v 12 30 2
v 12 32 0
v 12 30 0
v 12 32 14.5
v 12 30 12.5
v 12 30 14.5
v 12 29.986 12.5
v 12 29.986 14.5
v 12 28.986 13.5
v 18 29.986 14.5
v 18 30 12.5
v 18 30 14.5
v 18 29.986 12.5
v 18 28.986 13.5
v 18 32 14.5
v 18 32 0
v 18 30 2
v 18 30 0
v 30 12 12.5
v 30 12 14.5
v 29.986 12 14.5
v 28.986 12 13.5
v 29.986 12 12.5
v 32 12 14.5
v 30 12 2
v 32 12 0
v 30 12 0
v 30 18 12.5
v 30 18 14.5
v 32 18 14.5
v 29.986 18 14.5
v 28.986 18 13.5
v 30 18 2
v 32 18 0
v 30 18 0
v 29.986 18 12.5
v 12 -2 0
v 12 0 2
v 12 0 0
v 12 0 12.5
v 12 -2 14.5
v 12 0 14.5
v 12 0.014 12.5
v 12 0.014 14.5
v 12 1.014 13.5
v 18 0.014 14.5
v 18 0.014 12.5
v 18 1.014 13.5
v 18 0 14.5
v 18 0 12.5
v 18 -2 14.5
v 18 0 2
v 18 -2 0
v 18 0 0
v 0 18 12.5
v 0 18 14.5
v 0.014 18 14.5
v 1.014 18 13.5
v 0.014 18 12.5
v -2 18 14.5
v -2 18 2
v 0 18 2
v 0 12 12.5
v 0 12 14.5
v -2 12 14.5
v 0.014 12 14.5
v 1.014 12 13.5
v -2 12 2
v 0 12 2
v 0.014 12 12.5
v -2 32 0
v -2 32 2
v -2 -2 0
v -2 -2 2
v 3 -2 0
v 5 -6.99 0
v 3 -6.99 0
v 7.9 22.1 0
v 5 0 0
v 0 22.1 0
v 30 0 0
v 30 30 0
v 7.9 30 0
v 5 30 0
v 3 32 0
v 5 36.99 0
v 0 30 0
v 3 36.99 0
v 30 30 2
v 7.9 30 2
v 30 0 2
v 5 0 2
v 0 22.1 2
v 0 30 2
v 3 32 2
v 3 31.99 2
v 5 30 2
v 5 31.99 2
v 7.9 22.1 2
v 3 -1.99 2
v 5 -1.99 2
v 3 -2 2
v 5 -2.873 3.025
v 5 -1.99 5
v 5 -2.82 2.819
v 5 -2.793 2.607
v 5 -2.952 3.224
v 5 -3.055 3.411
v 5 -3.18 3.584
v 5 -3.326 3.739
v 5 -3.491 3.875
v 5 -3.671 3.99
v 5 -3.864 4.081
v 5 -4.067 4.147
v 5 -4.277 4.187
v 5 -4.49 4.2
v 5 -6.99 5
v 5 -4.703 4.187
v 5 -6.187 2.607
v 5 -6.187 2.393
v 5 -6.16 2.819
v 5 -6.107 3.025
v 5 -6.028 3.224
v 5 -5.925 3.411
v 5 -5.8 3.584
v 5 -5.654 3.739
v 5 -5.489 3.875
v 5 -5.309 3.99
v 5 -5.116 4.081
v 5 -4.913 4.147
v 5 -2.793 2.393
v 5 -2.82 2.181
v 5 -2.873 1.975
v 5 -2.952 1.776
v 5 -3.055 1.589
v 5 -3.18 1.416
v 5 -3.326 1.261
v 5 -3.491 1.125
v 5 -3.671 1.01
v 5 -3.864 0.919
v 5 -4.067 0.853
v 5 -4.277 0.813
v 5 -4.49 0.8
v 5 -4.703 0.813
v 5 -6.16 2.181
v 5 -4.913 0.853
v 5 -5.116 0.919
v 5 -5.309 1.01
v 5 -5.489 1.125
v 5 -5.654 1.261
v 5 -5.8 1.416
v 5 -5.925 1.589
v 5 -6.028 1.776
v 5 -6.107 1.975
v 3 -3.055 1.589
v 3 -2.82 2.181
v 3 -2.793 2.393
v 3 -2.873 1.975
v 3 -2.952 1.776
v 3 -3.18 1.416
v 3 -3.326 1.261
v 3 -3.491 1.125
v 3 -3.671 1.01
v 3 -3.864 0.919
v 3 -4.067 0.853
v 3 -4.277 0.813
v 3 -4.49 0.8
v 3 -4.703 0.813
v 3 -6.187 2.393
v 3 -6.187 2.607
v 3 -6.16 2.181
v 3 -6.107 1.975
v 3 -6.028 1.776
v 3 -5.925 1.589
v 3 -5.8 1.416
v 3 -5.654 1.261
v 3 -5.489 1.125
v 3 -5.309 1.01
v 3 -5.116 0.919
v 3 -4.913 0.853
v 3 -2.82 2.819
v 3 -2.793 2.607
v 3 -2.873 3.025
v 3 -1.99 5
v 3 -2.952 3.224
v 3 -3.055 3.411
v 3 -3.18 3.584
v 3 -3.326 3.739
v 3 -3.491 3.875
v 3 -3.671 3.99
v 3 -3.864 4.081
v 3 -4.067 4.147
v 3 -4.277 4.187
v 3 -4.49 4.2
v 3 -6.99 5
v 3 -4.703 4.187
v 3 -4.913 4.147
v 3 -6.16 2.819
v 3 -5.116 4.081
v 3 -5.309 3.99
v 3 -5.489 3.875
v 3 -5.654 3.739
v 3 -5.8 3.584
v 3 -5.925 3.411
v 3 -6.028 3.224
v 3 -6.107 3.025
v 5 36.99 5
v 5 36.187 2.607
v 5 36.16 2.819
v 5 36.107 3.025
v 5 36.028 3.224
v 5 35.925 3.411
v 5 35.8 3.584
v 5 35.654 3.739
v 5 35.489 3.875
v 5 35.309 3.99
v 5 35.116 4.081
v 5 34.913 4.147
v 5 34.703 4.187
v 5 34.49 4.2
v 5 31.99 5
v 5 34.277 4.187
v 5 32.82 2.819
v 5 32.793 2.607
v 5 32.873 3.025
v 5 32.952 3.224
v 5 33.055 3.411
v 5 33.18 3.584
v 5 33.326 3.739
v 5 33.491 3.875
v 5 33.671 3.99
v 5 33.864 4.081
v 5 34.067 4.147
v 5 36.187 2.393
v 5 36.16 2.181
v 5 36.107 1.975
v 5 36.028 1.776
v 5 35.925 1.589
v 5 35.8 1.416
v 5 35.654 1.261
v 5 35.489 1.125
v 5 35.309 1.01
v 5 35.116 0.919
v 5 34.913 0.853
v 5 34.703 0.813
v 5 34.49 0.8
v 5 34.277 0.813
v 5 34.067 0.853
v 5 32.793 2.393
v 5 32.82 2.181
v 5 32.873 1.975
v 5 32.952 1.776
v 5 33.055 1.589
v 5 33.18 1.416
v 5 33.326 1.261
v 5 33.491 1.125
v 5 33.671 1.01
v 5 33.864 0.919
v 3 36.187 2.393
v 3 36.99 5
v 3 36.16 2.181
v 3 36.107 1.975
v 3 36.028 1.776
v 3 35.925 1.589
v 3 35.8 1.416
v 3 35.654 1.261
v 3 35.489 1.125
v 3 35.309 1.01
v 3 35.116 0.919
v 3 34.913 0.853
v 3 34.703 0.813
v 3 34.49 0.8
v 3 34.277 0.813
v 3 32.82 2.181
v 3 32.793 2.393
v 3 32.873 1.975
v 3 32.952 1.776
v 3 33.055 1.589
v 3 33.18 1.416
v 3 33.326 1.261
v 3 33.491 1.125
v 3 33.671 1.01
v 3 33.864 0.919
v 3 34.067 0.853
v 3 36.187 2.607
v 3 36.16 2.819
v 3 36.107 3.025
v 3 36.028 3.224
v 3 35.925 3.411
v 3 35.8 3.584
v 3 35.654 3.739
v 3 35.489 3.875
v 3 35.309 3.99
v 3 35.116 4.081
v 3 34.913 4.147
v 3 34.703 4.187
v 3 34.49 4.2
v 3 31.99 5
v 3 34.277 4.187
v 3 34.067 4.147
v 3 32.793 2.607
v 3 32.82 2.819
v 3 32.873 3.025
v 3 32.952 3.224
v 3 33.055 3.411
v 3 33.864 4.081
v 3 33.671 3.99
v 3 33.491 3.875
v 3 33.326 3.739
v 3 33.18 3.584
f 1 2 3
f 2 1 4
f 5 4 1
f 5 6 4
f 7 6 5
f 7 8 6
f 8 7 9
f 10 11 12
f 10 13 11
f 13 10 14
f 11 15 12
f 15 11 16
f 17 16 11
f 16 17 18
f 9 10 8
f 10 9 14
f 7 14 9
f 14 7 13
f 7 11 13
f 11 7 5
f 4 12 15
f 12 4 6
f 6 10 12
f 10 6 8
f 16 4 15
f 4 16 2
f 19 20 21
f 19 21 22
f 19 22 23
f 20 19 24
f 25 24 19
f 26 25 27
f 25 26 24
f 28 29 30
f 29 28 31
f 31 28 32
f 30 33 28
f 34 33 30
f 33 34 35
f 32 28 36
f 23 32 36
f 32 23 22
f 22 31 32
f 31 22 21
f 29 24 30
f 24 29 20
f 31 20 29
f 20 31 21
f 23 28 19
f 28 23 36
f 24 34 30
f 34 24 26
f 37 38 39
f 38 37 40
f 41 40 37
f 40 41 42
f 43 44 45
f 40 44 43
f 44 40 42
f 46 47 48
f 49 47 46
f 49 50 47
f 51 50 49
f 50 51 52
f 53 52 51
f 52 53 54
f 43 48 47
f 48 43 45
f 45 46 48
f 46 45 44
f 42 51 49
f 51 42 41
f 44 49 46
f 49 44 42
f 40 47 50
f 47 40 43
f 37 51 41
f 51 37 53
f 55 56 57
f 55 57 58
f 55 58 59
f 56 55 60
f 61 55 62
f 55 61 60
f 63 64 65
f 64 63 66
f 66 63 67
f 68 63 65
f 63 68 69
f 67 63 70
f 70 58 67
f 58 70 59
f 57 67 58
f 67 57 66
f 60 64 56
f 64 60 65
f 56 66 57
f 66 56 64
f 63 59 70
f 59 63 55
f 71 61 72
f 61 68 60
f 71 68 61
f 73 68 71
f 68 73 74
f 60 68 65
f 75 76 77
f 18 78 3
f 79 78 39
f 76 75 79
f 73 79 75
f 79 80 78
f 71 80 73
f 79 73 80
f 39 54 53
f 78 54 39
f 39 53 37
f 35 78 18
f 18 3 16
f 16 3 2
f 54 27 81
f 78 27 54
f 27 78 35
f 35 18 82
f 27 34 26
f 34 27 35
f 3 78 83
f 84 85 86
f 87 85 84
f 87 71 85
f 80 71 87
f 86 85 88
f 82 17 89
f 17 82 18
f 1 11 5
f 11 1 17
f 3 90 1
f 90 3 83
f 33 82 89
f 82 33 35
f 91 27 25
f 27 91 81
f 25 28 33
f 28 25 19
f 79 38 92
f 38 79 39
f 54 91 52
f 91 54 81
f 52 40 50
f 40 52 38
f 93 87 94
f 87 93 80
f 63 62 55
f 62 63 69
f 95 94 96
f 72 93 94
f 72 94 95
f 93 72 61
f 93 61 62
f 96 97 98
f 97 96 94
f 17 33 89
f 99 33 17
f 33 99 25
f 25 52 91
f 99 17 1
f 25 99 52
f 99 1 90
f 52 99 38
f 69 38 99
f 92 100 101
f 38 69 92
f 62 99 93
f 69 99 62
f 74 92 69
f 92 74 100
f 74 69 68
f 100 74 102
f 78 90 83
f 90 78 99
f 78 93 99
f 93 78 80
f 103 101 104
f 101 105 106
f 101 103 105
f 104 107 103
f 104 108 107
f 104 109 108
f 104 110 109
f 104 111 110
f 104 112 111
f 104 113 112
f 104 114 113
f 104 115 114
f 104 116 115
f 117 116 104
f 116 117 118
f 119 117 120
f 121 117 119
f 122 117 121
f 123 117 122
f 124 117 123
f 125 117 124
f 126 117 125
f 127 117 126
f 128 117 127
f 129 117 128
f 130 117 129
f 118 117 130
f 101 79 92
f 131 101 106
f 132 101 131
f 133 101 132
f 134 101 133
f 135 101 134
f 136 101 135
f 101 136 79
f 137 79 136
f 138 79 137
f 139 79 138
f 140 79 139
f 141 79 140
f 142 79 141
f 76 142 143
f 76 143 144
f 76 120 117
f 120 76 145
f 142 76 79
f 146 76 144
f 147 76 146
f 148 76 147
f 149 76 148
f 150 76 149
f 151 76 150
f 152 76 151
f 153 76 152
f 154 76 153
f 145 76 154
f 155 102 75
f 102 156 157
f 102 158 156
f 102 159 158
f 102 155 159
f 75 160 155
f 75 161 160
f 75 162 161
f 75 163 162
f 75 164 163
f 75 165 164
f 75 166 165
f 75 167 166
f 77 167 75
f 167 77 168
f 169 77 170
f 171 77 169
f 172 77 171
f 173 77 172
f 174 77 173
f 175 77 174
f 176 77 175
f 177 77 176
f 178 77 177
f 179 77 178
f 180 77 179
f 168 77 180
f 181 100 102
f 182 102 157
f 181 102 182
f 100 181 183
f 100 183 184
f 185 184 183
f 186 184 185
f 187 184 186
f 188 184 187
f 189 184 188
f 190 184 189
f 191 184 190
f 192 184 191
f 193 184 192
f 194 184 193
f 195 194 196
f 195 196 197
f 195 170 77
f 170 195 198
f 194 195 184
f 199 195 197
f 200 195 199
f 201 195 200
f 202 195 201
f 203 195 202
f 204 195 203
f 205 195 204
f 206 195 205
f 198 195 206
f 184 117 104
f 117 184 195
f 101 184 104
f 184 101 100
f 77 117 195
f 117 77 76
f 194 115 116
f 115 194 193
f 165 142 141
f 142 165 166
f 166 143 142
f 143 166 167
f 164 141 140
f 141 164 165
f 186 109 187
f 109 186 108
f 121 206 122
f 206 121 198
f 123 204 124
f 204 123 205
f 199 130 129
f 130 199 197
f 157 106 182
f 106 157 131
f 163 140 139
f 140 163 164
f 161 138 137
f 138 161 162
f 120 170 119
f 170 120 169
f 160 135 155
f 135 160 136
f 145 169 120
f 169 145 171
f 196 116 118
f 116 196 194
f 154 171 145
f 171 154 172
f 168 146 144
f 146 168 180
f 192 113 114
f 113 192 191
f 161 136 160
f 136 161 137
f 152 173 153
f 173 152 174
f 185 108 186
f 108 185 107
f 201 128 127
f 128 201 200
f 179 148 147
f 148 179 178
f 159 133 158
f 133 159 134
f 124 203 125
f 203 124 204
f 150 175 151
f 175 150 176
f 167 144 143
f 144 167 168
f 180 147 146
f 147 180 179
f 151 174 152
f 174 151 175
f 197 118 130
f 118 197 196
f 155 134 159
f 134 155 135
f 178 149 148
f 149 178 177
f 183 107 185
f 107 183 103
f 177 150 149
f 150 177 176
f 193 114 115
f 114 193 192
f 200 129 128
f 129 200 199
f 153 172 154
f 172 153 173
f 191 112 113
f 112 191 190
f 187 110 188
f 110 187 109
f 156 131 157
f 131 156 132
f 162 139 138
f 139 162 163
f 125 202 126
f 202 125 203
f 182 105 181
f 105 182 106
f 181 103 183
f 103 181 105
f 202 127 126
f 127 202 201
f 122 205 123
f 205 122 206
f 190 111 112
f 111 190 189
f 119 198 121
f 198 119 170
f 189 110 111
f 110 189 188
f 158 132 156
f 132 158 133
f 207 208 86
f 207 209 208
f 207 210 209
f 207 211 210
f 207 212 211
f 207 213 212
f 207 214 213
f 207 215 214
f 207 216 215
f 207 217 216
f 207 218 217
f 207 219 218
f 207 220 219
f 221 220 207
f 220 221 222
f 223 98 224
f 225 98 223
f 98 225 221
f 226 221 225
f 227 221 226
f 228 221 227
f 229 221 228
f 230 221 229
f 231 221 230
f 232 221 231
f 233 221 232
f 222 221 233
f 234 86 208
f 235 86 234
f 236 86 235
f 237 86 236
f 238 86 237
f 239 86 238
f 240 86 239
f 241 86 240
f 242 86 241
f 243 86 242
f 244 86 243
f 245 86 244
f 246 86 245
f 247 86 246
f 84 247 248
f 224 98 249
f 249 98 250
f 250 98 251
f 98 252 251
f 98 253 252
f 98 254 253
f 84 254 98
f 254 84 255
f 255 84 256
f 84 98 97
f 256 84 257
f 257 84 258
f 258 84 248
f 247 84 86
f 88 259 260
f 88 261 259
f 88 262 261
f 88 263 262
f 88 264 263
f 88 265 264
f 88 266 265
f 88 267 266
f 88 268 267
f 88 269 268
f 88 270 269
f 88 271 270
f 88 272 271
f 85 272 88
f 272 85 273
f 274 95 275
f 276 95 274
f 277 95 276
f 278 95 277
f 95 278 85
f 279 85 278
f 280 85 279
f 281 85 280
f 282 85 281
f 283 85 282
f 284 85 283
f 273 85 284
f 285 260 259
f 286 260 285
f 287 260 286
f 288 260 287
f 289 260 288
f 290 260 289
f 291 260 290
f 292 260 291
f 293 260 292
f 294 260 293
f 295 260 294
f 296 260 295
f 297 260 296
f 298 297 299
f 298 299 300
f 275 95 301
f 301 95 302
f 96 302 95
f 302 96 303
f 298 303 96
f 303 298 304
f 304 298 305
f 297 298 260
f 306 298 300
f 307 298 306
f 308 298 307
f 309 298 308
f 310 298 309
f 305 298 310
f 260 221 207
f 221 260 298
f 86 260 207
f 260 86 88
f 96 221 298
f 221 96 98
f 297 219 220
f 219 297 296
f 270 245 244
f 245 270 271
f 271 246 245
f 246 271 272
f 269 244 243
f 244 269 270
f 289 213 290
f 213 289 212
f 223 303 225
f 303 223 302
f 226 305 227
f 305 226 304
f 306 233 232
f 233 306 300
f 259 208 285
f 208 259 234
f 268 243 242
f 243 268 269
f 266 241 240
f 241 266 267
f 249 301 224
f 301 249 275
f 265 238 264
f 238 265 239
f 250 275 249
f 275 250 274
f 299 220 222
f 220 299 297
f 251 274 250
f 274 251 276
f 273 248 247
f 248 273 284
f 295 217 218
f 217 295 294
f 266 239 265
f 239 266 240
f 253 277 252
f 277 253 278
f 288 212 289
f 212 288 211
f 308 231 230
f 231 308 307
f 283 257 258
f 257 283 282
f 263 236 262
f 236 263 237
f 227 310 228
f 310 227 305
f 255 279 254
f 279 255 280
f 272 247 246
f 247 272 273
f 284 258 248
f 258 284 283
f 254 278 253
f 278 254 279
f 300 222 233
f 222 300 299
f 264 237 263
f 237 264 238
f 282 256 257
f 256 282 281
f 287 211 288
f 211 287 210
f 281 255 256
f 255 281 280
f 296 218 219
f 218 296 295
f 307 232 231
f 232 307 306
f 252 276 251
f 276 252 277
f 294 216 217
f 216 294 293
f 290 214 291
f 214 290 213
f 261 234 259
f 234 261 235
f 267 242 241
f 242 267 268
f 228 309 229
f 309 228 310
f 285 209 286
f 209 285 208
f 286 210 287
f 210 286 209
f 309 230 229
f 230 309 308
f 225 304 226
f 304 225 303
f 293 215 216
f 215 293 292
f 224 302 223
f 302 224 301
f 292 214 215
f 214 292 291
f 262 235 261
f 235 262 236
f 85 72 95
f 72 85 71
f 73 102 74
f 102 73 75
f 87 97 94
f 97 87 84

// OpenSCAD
// file: ../../lib/utils.scad
// Cube with rounded corners
// roundedCornerCube (50,50,4);
module roundedCornerCube(length, width, thickness){

        hull()
        {
            translate([length/2 - 2, width/2 - 2, 0]) cylinder(r=2, h=thickness, $fn=50, center=true);
            translate([length/2 - 2, -width/2 + 2, 0]) cylinder(r=2, h=thickness, $fn=50, center=true);
            translate([-length/2 + 2, width/2 - 2, 0]) cylinder(r=2, h=thickness, $fn=50, center=true);
            translate([-length/2 + 2, -width/2 + 2, 0]) cylinder(r=2, h=thickness, $fn=50, center=true);
        }

}

// Hollow cube with rounded corners. Will look like a frame with rounded con
// hollowRoundedCornerCube(50,70,4,2);
module hollowRoundedCornerCube(length, width, thickness, wallthickness)
{
    difference()
    {
        roundedCornerCube(length,width,thickness);
        roundedCornerCube(length-(wallthickness*2),width-(wallthickness*2),thickness);
    }
}

/*
module cylinderWithHandle(radius, thickness)
{
    rotate_extrude($fn=100)
        polygon( points = [[0,0], [radius,0], [radius,thickness] , [1,thickness], [2,thickness + 2] , [2,thickness + 6],[0,thickness + 6]] );
}
*/


// hollow cylinder
// hollowCylinder(radius, height, wallThickness)
// radius : radius to outter wall
// wallThickness : Thickness of wall
module hollowCylinder(radius, height, wallThickness)
{

    difference()
    {
        cylinder(h=height, r1=radius, r2=radius);
        cylinder(h=height, r1=radius - wallThickness, r2=radius - wallThickness);
    }
}


// hollow cylinders
// hollowCylinders(20, 10, 2, 2, 2)
// radius : radius to outer wall
// gapsSize : size of gap between each rings
// minradius : radius of the smallest ring
module hollowCylinders(radius, height, wallThickness, gapSize, minRadius)
{
    for (i = [radius : -(gapSize + wallThickness) : minRadius])
    {
       //echo (i);
       hollowCylinder(i,height,wallThickness);
    }
}

//
// b = bottom diameter
// t = top diameter
// h = height
module cone(b, t, h)
{
    cylinder(h=h, r1=b/2, r2=t/2, $fn=100);
}

// hollowCone(10,4,20, 2)
module hollowCone(bottomRadius, topRadius, height, wallThickness)
{
    difference()
    {
        cylinder(h=height, r1=bottomRadius, r2=topRadius, $fn=100);
        cylinder(h=height, r1=bottomRadius - wallThickness, r2=topRadius - wallThickness, $fn=100);
    }
}


// w = width between flat surface
// h = height
module hex (w=10, h=2){
  cylinder (r=w/2, h=h, center=true, $fn=6);
}

// hollowCone(10,4,20, 2)
module hollowHex(w=10, h=2, th=2)
{
    difference()
    {
        cylinder (r=w/2, h=h, center=true, $fn=6);
        cylinder (r=w/2 - th, h=h, center=true, $fn=6);
    }
}

// h : height
// ns : number of sides for base
// br : bottom radius
// tr : top radius
// ro : rotation in degree between bottom and top
// sl : slice layer. high value give smooth appearence
module twistExtrude(h=50,ns=6,br=20,tr=20,ro=100,sl=5)
{

	linear_extrude(height = h, twist  = ro,	slices = sl, scale  = tr/br)
		circle(r=br, $fn=ns);
}


// h : height
// ns : number of sides for base
// br : bottom radius
// tr : top radius
// ro : rotation in degree between bottom and top
// sl : slice layer. high value give smooth appearence
// wt : wall thickness
module hollowTwistExtrude(h=50,ns=6,br=20,tr=20,ro=100,sl=5,wt=1)
{
	difference()
	{
		linear_extrude(height = h, twist  = ro,	slices = sl, scale  = tr/br)
			circle(r=br, $fn=ns);

    translate([0,0,-.01])
		linear_extrude(height = h + .1, twist  = ro,	slices = sl, scale  = tr/br)
			circle(r=br - wt, $fn=ns);
	}
}


///////////////////////////////////////////////////////////////////////////////////////////////////////////////////

// honeycomb tiles
// honeycombSquare(100,100,4,10,2);
module honeycombTiles(length, width,thickness,rad,wallThickness)
{
    //thickness = 4;
    //rad = 10;
    //wallThickness = 2;
    //length = 100;
    //width = 100;

    for (w=[0: width/rad])
    {

        if (w % 2 == 0)
        {
            //cylinder($fn=6, r=rad, h=2);
            for (i = [0 : length/((rad*2) + (wallThickness*2))])
            {
              translate([rad*(3*i) + (wallThickness*2)*i,w*rad,0]) cylinder($fn=6, r=rad, h=thickness);

              //translate([rad*6 + (wallThickness*2)*2,0,0]) cylinder($fn=6, r=10, h=2);
              //translate([rad*9 + (wallThickness*2)*3,0,0]) cylinder($fn=6, r=10, h=2);
            }
        }

        if (w % 2 == 1)
        {
            for (j = [1 : 2 : (length/(rad + wallThickness))])
            {
              translate([(rad*1.5) *j + wallThickness *j , (w*rad) + wallThickness/2 ,0])  cylinder($fn=6, r=rad, h=thickness);
                //translate([(rad*1.5) *3 + wallThickness *3 ,10,0]) circle($fn=6, r=10);
                //translate([(rad*1.5) *5 + wallThickness *5 ,10,0]) circle($fn=6, r=10);
            }
        }
    }
}

// honeycomb square
// A square area with hollow honeycomb design
// honeycombSquare(100,100,4,10,2);
module honeycombSquare(length, width, thickness, cellRad,wallThickness)
{
    difference()
    {
        cube([length,width,thickness], center=true);
        translate([-length/2,-width/2, -thickness/2]) honeycombTiles(length,width,thickness,cellRad,wallThickness);
    }
}

//honeycomb(length, width, height, cell_size, wall_thickness);
//honeycomb(50, 50, 4, 10, 1);
//hollowRoundedCornerCube(50,70,4,2);

//hollowCylinder(10,20,2);

//hollowCylinders(20, 10, 2, 2, 2);
//cone(10,2,20);

// hollowCone(10,4,20, 2);

// honeycombSquare(40,40,2,5,2);


module edgeClamp(l=10)
{
   difference()
   {
    translate([0,.6,0]) rotate([45,0,0]) cube([l,2,2], center=true);
    translate([0,.6,1.5]) cube([l + .1,1,1], center=true);
    translate([0,.6,-1.5]) cube([l + .1,1,1], center=true);
   }
   cube([l,2,2], center=true);
}

cube([10,2,2], center=true);
translate([0,0,2]) edgeClamp();
// main file
use <../../lib/utils.scad>

/*
l = 29.9
w=29.9
h=10.5
*/


// h = height
// wt = wall thickness
// sw = side stop width
// bl =  base inside length
// bw = base inside width
// bt = base thickness
module cam_sideStops(h,wt, sw, bl,bw,bt)
{

  //when in front view
  //top
  translate([(bl-sw)/2,bw,0]) cube([sw,wt,h]);
  translate([bl/2,bw + 1,h + 1]) rotate([180,0,0]) edgeClamp(l=sw);

  // right
  translate([bl,(bw - sw)/2,0]) cube([wt,sw,h]);
  translate([bl + 1, bw/2,h + 1]) rotate([0,0,90]) edgeClamp(l=sw);

  //bottom
  translate([(bl-sw)/2,-2,0]) cube([sw,wt,h]);
  translate([bl/2,-1,h + 1]) edgeClamp(l=sw);

  //left
  translate([-2,(bw - sw)/2,0]) cube([wt,sw,h]);
  translate([-1,bw/2,h + 1]) rotate([0,0,-90]) edgeClamp(l=sw);

}

// l =  length of cam
// w = width of cam
// h = height of cam
// t = thickness of base
module cam_holder(l=cam_holder_l(), w=cam_holder_w() ,h=cam_holder_h() ,  t=cam_holder_t() )
{
  difference()
  {
    union()
    {
      cube([l,w,t]);
      cam_sideStops(h= (h + t),wt=2,sw=6 , bl=l , bw=w, bt=t);
    }
    translate([-.1, cam_holder_w() - 8 +.1,-.1]) cube([8,8,8]);
  }

  translate([-2,-2,0]) cube([2,l + 4,t]);
  translate([0,-2,0]) cube([5,2,t]);
  translate([0,cam_holder_w(),0]) cube([5,2,t]);

// fastner holes
translate([3,-5/2 - 2 + .01,5/2])
  rotate([0,90,0])
    difference()
    {
      translate([0,0,2/2]) cube([5, 5, 2], center=true);
      translate([0,0,-0.1])	cylinder(r = 3.4/2, h=5 + 0.2, $fn=50);
    }

translate([3,cam_holder_w() + 5/2 + 2 - .01,5/2])
  rotate([0,90,0])
    difference()
    {
      translate([0,0,2/2]) cube([5, 5, 2], center=true);
      translate([0,0,-0.1])	cylinder(r = 3.4/2, h=5 + 0.2, $fn=50);
    }


  %cam_sample();
}

module cam_sample()
{
  translate([0,0,2]) cube([30,30,10.5]);
  translate([15,15,2]) cylinder(h=20, r1=5, r2=5, $fn=50);
}

function cam_holder_l() = 30;
function cam_holder_w() = 30;
function cam_holder_h() = 10.5;
function cam_holder_t() = 2;

//cam_sample();
cam_holder(l=cam_holder_l(), w=cam_holder_w() , h=cam_holder_h(), t=cam_holder_t());
